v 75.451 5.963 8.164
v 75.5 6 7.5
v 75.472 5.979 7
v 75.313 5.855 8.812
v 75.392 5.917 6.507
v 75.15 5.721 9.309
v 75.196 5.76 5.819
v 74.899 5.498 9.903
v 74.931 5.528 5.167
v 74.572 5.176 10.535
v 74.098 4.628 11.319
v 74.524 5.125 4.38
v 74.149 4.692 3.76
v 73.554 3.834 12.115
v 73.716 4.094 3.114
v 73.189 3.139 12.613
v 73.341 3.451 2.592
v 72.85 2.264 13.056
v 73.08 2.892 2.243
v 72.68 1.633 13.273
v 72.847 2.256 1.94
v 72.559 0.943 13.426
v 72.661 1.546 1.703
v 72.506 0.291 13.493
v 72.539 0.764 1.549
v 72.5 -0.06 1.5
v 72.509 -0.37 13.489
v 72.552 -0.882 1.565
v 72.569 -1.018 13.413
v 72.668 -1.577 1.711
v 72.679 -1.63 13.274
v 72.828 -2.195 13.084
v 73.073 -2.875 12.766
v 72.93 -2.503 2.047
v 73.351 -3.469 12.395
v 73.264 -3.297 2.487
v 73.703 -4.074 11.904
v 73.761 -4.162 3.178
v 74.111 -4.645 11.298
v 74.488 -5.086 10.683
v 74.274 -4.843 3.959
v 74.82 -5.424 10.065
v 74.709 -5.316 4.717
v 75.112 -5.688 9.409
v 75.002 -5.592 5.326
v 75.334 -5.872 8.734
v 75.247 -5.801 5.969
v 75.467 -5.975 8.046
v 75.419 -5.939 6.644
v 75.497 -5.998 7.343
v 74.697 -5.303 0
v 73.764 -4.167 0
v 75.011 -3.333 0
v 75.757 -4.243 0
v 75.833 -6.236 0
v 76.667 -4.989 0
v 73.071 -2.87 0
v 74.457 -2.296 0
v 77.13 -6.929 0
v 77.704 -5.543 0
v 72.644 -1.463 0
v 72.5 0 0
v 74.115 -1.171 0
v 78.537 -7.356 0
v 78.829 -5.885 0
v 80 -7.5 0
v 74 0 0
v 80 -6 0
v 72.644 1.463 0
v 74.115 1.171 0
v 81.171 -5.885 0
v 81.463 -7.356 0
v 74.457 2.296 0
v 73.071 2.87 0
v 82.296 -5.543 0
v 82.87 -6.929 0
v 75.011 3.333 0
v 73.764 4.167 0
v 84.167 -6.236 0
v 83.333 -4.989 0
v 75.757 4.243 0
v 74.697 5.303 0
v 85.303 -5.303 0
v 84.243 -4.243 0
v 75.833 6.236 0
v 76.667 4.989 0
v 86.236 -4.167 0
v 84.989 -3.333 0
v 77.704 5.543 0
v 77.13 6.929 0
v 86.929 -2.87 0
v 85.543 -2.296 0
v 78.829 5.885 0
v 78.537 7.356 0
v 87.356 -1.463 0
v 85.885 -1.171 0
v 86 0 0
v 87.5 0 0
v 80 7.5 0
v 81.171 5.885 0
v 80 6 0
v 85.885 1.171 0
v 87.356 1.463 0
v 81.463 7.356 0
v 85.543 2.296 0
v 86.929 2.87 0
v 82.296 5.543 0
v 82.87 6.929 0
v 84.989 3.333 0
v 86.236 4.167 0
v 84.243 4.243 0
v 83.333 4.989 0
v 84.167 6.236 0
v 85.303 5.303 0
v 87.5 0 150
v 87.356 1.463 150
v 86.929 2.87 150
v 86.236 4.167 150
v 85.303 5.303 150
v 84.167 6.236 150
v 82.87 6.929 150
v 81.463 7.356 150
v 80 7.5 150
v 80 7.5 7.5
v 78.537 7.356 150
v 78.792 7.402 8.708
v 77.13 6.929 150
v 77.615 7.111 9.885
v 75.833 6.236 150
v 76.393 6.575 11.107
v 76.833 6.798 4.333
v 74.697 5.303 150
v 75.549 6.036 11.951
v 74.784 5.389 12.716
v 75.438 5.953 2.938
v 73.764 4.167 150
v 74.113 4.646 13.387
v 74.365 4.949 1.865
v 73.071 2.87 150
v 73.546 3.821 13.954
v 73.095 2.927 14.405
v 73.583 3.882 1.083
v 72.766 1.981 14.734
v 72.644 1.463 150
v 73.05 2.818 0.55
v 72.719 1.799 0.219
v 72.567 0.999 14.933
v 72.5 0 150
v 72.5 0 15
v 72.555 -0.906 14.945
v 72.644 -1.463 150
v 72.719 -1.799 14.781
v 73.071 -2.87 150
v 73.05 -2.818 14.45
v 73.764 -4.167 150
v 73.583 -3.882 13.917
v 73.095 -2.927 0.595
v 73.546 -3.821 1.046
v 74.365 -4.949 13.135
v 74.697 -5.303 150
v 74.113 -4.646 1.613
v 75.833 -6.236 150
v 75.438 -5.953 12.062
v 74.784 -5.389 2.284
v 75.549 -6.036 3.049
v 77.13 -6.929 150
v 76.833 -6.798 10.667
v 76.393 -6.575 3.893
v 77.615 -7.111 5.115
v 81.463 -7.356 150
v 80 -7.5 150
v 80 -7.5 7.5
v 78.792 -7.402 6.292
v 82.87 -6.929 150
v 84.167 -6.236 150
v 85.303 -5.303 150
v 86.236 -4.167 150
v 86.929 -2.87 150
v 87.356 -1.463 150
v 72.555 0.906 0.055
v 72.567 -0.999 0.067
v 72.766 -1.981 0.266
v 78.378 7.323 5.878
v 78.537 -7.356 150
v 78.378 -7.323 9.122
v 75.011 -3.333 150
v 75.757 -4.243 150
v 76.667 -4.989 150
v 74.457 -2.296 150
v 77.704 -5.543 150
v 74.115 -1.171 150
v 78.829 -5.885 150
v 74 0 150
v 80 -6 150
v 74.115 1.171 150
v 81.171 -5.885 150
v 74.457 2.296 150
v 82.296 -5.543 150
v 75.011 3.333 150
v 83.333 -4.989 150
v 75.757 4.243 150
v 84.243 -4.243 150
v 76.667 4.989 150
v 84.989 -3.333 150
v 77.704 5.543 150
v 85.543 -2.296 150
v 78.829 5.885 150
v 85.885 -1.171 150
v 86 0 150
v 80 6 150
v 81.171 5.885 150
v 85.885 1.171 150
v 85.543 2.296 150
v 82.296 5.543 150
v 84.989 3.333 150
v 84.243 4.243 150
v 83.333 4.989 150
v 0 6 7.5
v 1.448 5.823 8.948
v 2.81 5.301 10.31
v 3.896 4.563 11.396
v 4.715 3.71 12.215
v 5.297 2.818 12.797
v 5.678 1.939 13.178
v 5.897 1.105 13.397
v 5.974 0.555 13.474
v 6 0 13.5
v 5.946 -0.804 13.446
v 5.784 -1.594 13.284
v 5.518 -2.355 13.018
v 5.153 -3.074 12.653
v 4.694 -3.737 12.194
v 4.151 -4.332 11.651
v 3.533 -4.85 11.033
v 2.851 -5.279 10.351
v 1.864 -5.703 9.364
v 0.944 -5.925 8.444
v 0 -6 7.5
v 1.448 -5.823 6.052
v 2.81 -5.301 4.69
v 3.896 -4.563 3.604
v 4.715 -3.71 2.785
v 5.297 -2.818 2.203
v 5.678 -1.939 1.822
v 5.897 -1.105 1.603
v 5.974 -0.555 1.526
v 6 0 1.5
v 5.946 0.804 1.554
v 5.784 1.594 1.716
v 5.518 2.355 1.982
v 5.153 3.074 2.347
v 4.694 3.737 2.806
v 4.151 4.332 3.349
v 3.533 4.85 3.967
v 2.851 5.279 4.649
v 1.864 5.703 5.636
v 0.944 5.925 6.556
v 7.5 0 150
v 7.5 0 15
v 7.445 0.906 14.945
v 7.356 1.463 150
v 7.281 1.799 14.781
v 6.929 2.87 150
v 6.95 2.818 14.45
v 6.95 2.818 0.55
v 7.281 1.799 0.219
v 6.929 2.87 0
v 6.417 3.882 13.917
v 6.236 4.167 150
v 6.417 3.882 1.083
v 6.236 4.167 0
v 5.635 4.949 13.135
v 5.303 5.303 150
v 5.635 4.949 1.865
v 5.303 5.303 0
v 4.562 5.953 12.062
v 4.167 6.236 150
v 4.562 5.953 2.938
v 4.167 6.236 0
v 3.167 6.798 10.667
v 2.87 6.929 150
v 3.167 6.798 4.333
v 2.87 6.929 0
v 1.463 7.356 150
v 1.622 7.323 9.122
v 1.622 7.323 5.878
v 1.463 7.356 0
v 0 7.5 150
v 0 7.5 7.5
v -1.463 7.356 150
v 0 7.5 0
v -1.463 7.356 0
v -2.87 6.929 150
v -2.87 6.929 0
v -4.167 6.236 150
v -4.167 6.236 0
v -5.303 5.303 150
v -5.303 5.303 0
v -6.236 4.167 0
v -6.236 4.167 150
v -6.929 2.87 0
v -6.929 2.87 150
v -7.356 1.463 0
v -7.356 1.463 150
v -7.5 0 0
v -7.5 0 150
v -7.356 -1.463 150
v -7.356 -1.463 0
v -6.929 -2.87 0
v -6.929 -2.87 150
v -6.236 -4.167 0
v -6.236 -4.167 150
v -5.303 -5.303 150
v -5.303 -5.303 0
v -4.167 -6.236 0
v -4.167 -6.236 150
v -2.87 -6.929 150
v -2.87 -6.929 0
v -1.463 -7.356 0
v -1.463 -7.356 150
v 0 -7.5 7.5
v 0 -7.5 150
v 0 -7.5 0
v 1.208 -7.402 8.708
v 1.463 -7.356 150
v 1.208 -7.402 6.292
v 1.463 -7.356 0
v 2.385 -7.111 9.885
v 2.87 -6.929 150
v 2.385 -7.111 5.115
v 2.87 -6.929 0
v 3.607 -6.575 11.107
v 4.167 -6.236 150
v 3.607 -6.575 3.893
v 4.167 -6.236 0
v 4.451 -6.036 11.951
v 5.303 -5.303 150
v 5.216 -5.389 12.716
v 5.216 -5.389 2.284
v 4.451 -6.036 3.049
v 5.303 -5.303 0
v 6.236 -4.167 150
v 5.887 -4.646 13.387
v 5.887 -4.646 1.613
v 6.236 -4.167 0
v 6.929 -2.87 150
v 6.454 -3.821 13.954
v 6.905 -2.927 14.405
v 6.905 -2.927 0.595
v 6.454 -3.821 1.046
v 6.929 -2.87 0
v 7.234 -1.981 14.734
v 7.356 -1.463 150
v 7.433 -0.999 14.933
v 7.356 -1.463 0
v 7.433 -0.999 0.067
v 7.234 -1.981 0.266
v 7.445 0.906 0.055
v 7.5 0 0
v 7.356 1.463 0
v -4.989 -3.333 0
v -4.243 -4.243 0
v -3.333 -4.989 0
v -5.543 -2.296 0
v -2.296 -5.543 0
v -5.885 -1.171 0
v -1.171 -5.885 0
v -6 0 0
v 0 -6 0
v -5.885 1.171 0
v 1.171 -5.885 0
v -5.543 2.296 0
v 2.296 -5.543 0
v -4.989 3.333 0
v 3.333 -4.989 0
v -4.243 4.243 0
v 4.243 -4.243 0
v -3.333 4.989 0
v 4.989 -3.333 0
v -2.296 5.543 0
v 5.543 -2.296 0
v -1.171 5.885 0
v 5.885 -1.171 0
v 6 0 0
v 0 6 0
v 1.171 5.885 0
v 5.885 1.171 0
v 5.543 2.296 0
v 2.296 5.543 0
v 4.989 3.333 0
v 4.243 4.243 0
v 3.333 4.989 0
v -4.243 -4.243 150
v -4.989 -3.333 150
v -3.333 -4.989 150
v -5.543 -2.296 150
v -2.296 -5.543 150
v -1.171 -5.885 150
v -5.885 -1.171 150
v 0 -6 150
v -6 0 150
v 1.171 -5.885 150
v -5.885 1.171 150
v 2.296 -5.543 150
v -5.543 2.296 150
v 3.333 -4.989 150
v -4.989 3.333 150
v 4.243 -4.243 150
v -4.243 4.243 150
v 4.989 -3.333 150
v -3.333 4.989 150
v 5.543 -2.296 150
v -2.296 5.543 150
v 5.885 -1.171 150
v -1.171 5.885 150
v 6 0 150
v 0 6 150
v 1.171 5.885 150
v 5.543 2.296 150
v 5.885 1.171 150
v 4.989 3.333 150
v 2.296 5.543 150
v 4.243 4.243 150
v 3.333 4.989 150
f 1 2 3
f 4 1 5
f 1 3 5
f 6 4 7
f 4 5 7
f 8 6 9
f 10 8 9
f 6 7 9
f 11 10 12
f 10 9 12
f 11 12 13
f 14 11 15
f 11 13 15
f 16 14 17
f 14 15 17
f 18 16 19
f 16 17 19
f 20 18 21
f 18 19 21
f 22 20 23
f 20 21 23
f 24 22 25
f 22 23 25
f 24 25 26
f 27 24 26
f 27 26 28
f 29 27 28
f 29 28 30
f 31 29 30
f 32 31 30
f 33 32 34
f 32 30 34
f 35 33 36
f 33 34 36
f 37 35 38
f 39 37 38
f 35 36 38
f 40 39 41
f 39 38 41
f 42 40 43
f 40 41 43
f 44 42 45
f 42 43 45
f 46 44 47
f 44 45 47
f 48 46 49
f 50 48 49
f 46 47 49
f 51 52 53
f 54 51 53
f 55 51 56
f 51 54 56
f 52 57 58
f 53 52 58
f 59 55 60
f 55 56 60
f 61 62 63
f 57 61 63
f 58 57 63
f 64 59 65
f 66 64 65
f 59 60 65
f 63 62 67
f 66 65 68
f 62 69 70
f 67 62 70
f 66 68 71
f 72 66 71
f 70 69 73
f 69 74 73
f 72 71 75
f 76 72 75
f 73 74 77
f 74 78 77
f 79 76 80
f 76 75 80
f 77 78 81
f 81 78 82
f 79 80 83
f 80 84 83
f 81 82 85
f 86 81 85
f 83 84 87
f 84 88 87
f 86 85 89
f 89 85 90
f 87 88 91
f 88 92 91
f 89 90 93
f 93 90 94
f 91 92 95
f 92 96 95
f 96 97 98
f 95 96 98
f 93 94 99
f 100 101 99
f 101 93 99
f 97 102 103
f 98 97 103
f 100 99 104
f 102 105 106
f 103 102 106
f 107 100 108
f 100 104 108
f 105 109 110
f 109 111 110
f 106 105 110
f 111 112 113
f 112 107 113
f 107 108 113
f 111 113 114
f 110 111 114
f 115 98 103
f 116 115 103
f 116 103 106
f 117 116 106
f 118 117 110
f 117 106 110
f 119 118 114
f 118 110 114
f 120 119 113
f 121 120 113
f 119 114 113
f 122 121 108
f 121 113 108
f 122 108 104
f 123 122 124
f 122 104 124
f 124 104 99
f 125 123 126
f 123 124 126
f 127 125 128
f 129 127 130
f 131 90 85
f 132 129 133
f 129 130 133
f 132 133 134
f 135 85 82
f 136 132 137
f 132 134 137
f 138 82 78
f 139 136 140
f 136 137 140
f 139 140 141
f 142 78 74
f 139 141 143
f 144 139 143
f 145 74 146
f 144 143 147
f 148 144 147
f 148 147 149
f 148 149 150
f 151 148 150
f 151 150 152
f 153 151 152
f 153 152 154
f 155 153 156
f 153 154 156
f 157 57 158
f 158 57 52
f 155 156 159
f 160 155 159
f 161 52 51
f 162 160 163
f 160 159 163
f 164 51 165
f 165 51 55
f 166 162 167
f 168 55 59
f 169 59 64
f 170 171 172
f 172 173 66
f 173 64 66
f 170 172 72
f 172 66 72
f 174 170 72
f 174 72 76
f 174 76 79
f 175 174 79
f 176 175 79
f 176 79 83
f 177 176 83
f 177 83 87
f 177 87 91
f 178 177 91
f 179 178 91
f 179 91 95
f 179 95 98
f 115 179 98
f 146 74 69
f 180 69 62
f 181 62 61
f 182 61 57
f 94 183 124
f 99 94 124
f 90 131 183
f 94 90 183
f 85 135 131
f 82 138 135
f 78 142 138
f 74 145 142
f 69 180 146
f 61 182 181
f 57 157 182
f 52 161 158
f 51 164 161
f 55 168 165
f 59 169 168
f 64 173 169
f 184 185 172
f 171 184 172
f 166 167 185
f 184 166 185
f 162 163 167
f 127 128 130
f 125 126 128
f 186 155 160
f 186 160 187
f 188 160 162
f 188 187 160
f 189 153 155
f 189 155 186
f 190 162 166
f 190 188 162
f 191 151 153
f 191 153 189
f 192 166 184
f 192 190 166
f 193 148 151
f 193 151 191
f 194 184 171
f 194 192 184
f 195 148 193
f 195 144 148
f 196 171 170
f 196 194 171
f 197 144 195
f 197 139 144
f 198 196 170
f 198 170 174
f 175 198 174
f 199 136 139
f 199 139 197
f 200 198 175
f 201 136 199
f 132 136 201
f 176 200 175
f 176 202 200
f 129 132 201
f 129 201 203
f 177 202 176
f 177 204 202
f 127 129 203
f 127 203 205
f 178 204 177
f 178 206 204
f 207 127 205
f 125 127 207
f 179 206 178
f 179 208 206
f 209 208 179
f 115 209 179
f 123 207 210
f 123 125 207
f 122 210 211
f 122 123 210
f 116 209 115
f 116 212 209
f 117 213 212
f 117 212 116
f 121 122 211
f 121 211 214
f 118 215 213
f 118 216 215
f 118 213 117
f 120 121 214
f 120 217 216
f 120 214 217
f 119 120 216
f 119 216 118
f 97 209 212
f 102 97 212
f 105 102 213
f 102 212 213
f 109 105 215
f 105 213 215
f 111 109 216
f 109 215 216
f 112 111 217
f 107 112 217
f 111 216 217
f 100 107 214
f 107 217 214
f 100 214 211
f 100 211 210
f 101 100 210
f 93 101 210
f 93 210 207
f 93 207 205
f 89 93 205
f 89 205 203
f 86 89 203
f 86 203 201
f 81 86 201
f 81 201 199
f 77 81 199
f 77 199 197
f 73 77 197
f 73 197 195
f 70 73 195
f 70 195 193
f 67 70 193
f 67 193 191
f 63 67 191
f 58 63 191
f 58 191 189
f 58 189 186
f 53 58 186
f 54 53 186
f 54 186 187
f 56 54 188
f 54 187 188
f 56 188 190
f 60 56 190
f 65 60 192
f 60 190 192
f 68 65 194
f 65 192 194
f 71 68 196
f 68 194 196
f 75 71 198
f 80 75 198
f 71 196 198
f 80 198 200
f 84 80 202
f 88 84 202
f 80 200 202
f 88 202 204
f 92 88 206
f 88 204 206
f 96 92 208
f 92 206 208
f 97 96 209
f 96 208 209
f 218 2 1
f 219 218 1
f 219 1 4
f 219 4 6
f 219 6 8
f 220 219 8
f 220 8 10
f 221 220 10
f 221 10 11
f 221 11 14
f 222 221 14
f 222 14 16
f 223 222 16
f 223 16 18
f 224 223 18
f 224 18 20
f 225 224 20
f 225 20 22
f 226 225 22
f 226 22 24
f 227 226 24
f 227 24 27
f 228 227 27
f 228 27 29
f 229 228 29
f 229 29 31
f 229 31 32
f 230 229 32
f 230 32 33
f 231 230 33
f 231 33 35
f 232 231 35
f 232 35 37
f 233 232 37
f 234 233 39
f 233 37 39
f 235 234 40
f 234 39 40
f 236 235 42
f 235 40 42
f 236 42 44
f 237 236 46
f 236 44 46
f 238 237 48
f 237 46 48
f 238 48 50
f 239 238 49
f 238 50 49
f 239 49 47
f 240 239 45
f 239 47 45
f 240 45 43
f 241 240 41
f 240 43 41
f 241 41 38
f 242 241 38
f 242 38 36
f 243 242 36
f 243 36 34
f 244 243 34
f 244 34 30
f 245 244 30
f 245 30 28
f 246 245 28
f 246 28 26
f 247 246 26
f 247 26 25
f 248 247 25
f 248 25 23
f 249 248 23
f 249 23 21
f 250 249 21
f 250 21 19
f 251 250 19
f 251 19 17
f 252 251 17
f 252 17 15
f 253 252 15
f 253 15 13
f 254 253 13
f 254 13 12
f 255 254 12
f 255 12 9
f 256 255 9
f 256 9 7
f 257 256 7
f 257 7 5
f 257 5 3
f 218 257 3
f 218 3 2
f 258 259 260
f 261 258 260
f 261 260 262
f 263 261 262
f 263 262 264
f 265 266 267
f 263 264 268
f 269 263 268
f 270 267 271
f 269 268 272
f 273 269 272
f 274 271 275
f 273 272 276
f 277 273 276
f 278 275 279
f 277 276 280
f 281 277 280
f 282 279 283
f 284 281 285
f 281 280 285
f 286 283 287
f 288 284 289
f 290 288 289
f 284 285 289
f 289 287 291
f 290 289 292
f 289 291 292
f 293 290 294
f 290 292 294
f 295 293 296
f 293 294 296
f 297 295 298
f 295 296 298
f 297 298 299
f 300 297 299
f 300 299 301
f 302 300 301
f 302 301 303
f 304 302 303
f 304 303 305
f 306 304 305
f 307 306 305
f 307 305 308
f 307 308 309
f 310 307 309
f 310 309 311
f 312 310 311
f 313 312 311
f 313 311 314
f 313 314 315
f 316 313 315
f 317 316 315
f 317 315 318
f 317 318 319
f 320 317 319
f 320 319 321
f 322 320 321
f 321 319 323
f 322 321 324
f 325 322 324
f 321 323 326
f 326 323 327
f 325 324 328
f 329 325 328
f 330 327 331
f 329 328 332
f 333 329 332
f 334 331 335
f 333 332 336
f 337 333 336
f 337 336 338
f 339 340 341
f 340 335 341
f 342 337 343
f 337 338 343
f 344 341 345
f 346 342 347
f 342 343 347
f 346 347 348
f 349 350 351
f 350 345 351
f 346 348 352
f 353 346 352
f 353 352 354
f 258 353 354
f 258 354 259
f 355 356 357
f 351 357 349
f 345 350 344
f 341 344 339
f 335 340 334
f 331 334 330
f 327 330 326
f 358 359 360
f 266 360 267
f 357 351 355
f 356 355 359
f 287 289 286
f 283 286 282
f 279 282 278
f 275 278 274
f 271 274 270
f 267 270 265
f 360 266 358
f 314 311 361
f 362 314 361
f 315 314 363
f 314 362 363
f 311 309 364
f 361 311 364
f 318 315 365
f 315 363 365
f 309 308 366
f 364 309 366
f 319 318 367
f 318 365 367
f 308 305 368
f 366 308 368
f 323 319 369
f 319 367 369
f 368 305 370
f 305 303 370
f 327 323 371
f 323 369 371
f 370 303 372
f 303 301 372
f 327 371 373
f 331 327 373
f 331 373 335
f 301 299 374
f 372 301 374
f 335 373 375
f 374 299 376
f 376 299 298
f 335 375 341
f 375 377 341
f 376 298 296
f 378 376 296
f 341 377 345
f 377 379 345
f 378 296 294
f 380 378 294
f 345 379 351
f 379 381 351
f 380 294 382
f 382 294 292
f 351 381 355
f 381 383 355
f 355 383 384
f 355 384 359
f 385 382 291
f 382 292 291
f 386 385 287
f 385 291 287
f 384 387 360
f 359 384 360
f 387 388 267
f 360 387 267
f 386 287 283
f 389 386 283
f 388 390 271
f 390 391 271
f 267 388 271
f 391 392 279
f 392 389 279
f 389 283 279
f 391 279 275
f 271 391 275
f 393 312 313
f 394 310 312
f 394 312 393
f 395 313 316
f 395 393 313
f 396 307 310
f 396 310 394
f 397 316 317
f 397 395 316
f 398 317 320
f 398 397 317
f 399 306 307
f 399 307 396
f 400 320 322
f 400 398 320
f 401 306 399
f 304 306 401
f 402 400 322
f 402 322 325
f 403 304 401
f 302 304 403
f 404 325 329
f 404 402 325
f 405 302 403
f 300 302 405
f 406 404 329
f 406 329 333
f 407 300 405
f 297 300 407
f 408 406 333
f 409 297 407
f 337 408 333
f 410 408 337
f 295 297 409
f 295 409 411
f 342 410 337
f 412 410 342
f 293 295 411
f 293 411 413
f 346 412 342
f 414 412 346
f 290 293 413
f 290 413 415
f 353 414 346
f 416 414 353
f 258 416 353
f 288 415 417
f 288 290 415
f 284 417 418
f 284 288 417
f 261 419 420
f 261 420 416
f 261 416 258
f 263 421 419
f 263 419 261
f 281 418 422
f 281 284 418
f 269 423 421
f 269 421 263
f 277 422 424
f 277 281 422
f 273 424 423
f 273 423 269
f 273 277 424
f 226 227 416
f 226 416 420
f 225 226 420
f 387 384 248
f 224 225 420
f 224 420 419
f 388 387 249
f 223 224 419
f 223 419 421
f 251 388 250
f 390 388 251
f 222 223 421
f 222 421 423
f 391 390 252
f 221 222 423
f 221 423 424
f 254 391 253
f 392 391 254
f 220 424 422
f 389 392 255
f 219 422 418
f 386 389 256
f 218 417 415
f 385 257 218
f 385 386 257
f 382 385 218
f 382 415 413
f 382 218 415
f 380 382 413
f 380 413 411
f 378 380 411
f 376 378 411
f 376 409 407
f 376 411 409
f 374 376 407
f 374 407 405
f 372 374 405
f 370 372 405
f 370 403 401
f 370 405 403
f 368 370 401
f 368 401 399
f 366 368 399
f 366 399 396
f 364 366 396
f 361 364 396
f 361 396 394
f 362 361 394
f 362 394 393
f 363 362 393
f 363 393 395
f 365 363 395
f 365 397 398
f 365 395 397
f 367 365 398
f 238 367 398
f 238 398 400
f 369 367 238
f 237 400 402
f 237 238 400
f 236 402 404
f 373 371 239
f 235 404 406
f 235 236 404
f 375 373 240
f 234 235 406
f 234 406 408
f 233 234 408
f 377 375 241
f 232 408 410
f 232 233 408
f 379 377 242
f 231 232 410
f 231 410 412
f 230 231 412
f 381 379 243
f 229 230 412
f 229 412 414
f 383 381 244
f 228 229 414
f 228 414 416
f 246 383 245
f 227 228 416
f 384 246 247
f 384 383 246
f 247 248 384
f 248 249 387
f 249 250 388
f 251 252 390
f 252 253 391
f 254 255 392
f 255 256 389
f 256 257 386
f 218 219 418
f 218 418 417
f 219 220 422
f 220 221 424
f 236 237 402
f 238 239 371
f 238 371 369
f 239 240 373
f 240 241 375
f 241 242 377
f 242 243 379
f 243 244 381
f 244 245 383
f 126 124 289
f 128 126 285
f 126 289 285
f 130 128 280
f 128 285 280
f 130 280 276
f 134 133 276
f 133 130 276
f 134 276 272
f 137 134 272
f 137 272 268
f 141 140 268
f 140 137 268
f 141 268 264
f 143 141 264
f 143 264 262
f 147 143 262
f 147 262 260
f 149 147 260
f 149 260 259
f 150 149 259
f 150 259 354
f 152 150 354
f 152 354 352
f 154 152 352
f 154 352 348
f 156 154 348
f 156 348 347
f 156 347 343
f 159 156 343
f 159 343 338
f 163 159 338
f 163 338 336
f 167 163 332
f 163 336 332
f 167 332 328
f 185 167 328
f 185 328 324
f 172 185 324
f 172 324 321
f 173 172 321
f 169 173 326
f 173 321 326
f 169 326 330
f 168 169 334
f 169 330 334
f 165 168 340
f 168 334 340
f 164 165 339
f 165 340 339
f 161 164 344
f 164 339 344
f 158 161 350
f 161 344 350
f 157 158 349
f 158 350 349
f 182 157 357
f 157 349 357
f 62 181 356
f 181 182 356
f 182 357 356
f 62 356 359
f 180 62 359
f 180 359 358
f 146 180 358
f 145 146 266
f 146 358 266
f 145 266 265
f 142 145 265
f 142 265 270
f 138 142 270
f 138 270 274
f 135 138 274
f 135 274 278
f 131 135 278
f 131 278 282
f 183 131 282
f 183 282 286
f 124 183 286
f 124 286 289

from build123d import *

# Parameters (mm, degrees)
F0_R      = 7.5
F1_DEPTH  = 150
F2_R      = 6
F3_DEPTH  = 300
F4_R      = 7.5
F5_DEPTH  = 80
F6_R      = 6
F7_DEPTH  = 80
F8_R      = 7.5
F9_DEPTH  = 150
F10_R     = 6
F11_DEPTH = 300
F12_R     = 6
F13_DEPTH = 300


with BuildPart() as f1:
    # F0 (on Top) → F1 (new body)
    with BuildSketch(Plane.XY):
        Circle(F0_R)
    extrude(amount=F1_DEPTH)

    # F2 (on face) → F3 (cut)
    with BuildSketch(Plane.XY):
        Circle(F2_R)
    extrude(amount=-F3_DEPTH, mode=Mode.SUBTRACT)

    # F4 (on Right) → F5 (join)
    with BuildSketch(Plane.YZ):
        with Locations((0, 7.5)):
            Circle(F4_R)
    extrude(amount=F5_DEPTH)

    # F6 (on face) → F7 (cut)
    with BuildSketch(Plane.YZ.offset(80)):
        with Locations((0, 7.5)):
            Circle(F6_R)
    extrude(amount=-F7_DEPTH, mode=Mode.SUBTRACT)

    # F8 (on Top) → F9 (join)
    with BuildSketch(Plane.XY):
        with Locations((80, 0)):
            Circle(F8_R)
    extrude(amount=F9_DEPTH)

    # F10 (on face) → F11 (cut)
    with BuildSketch(Plane.XY.offset(150)):
        with Locations((80, 0)):
            Circle(F10_R)
    extrude(amount=-F11_DEPTH, mode=Mode.SUBTRACT)

    # F12 (on Top) → F13 (cut)
    with BuildSketch(Plane.XY):
        Circle(F12_R)
    extrude(amount=F13_DEPTH, mode=Mode.SUBTRACT)


solid = f1.part
